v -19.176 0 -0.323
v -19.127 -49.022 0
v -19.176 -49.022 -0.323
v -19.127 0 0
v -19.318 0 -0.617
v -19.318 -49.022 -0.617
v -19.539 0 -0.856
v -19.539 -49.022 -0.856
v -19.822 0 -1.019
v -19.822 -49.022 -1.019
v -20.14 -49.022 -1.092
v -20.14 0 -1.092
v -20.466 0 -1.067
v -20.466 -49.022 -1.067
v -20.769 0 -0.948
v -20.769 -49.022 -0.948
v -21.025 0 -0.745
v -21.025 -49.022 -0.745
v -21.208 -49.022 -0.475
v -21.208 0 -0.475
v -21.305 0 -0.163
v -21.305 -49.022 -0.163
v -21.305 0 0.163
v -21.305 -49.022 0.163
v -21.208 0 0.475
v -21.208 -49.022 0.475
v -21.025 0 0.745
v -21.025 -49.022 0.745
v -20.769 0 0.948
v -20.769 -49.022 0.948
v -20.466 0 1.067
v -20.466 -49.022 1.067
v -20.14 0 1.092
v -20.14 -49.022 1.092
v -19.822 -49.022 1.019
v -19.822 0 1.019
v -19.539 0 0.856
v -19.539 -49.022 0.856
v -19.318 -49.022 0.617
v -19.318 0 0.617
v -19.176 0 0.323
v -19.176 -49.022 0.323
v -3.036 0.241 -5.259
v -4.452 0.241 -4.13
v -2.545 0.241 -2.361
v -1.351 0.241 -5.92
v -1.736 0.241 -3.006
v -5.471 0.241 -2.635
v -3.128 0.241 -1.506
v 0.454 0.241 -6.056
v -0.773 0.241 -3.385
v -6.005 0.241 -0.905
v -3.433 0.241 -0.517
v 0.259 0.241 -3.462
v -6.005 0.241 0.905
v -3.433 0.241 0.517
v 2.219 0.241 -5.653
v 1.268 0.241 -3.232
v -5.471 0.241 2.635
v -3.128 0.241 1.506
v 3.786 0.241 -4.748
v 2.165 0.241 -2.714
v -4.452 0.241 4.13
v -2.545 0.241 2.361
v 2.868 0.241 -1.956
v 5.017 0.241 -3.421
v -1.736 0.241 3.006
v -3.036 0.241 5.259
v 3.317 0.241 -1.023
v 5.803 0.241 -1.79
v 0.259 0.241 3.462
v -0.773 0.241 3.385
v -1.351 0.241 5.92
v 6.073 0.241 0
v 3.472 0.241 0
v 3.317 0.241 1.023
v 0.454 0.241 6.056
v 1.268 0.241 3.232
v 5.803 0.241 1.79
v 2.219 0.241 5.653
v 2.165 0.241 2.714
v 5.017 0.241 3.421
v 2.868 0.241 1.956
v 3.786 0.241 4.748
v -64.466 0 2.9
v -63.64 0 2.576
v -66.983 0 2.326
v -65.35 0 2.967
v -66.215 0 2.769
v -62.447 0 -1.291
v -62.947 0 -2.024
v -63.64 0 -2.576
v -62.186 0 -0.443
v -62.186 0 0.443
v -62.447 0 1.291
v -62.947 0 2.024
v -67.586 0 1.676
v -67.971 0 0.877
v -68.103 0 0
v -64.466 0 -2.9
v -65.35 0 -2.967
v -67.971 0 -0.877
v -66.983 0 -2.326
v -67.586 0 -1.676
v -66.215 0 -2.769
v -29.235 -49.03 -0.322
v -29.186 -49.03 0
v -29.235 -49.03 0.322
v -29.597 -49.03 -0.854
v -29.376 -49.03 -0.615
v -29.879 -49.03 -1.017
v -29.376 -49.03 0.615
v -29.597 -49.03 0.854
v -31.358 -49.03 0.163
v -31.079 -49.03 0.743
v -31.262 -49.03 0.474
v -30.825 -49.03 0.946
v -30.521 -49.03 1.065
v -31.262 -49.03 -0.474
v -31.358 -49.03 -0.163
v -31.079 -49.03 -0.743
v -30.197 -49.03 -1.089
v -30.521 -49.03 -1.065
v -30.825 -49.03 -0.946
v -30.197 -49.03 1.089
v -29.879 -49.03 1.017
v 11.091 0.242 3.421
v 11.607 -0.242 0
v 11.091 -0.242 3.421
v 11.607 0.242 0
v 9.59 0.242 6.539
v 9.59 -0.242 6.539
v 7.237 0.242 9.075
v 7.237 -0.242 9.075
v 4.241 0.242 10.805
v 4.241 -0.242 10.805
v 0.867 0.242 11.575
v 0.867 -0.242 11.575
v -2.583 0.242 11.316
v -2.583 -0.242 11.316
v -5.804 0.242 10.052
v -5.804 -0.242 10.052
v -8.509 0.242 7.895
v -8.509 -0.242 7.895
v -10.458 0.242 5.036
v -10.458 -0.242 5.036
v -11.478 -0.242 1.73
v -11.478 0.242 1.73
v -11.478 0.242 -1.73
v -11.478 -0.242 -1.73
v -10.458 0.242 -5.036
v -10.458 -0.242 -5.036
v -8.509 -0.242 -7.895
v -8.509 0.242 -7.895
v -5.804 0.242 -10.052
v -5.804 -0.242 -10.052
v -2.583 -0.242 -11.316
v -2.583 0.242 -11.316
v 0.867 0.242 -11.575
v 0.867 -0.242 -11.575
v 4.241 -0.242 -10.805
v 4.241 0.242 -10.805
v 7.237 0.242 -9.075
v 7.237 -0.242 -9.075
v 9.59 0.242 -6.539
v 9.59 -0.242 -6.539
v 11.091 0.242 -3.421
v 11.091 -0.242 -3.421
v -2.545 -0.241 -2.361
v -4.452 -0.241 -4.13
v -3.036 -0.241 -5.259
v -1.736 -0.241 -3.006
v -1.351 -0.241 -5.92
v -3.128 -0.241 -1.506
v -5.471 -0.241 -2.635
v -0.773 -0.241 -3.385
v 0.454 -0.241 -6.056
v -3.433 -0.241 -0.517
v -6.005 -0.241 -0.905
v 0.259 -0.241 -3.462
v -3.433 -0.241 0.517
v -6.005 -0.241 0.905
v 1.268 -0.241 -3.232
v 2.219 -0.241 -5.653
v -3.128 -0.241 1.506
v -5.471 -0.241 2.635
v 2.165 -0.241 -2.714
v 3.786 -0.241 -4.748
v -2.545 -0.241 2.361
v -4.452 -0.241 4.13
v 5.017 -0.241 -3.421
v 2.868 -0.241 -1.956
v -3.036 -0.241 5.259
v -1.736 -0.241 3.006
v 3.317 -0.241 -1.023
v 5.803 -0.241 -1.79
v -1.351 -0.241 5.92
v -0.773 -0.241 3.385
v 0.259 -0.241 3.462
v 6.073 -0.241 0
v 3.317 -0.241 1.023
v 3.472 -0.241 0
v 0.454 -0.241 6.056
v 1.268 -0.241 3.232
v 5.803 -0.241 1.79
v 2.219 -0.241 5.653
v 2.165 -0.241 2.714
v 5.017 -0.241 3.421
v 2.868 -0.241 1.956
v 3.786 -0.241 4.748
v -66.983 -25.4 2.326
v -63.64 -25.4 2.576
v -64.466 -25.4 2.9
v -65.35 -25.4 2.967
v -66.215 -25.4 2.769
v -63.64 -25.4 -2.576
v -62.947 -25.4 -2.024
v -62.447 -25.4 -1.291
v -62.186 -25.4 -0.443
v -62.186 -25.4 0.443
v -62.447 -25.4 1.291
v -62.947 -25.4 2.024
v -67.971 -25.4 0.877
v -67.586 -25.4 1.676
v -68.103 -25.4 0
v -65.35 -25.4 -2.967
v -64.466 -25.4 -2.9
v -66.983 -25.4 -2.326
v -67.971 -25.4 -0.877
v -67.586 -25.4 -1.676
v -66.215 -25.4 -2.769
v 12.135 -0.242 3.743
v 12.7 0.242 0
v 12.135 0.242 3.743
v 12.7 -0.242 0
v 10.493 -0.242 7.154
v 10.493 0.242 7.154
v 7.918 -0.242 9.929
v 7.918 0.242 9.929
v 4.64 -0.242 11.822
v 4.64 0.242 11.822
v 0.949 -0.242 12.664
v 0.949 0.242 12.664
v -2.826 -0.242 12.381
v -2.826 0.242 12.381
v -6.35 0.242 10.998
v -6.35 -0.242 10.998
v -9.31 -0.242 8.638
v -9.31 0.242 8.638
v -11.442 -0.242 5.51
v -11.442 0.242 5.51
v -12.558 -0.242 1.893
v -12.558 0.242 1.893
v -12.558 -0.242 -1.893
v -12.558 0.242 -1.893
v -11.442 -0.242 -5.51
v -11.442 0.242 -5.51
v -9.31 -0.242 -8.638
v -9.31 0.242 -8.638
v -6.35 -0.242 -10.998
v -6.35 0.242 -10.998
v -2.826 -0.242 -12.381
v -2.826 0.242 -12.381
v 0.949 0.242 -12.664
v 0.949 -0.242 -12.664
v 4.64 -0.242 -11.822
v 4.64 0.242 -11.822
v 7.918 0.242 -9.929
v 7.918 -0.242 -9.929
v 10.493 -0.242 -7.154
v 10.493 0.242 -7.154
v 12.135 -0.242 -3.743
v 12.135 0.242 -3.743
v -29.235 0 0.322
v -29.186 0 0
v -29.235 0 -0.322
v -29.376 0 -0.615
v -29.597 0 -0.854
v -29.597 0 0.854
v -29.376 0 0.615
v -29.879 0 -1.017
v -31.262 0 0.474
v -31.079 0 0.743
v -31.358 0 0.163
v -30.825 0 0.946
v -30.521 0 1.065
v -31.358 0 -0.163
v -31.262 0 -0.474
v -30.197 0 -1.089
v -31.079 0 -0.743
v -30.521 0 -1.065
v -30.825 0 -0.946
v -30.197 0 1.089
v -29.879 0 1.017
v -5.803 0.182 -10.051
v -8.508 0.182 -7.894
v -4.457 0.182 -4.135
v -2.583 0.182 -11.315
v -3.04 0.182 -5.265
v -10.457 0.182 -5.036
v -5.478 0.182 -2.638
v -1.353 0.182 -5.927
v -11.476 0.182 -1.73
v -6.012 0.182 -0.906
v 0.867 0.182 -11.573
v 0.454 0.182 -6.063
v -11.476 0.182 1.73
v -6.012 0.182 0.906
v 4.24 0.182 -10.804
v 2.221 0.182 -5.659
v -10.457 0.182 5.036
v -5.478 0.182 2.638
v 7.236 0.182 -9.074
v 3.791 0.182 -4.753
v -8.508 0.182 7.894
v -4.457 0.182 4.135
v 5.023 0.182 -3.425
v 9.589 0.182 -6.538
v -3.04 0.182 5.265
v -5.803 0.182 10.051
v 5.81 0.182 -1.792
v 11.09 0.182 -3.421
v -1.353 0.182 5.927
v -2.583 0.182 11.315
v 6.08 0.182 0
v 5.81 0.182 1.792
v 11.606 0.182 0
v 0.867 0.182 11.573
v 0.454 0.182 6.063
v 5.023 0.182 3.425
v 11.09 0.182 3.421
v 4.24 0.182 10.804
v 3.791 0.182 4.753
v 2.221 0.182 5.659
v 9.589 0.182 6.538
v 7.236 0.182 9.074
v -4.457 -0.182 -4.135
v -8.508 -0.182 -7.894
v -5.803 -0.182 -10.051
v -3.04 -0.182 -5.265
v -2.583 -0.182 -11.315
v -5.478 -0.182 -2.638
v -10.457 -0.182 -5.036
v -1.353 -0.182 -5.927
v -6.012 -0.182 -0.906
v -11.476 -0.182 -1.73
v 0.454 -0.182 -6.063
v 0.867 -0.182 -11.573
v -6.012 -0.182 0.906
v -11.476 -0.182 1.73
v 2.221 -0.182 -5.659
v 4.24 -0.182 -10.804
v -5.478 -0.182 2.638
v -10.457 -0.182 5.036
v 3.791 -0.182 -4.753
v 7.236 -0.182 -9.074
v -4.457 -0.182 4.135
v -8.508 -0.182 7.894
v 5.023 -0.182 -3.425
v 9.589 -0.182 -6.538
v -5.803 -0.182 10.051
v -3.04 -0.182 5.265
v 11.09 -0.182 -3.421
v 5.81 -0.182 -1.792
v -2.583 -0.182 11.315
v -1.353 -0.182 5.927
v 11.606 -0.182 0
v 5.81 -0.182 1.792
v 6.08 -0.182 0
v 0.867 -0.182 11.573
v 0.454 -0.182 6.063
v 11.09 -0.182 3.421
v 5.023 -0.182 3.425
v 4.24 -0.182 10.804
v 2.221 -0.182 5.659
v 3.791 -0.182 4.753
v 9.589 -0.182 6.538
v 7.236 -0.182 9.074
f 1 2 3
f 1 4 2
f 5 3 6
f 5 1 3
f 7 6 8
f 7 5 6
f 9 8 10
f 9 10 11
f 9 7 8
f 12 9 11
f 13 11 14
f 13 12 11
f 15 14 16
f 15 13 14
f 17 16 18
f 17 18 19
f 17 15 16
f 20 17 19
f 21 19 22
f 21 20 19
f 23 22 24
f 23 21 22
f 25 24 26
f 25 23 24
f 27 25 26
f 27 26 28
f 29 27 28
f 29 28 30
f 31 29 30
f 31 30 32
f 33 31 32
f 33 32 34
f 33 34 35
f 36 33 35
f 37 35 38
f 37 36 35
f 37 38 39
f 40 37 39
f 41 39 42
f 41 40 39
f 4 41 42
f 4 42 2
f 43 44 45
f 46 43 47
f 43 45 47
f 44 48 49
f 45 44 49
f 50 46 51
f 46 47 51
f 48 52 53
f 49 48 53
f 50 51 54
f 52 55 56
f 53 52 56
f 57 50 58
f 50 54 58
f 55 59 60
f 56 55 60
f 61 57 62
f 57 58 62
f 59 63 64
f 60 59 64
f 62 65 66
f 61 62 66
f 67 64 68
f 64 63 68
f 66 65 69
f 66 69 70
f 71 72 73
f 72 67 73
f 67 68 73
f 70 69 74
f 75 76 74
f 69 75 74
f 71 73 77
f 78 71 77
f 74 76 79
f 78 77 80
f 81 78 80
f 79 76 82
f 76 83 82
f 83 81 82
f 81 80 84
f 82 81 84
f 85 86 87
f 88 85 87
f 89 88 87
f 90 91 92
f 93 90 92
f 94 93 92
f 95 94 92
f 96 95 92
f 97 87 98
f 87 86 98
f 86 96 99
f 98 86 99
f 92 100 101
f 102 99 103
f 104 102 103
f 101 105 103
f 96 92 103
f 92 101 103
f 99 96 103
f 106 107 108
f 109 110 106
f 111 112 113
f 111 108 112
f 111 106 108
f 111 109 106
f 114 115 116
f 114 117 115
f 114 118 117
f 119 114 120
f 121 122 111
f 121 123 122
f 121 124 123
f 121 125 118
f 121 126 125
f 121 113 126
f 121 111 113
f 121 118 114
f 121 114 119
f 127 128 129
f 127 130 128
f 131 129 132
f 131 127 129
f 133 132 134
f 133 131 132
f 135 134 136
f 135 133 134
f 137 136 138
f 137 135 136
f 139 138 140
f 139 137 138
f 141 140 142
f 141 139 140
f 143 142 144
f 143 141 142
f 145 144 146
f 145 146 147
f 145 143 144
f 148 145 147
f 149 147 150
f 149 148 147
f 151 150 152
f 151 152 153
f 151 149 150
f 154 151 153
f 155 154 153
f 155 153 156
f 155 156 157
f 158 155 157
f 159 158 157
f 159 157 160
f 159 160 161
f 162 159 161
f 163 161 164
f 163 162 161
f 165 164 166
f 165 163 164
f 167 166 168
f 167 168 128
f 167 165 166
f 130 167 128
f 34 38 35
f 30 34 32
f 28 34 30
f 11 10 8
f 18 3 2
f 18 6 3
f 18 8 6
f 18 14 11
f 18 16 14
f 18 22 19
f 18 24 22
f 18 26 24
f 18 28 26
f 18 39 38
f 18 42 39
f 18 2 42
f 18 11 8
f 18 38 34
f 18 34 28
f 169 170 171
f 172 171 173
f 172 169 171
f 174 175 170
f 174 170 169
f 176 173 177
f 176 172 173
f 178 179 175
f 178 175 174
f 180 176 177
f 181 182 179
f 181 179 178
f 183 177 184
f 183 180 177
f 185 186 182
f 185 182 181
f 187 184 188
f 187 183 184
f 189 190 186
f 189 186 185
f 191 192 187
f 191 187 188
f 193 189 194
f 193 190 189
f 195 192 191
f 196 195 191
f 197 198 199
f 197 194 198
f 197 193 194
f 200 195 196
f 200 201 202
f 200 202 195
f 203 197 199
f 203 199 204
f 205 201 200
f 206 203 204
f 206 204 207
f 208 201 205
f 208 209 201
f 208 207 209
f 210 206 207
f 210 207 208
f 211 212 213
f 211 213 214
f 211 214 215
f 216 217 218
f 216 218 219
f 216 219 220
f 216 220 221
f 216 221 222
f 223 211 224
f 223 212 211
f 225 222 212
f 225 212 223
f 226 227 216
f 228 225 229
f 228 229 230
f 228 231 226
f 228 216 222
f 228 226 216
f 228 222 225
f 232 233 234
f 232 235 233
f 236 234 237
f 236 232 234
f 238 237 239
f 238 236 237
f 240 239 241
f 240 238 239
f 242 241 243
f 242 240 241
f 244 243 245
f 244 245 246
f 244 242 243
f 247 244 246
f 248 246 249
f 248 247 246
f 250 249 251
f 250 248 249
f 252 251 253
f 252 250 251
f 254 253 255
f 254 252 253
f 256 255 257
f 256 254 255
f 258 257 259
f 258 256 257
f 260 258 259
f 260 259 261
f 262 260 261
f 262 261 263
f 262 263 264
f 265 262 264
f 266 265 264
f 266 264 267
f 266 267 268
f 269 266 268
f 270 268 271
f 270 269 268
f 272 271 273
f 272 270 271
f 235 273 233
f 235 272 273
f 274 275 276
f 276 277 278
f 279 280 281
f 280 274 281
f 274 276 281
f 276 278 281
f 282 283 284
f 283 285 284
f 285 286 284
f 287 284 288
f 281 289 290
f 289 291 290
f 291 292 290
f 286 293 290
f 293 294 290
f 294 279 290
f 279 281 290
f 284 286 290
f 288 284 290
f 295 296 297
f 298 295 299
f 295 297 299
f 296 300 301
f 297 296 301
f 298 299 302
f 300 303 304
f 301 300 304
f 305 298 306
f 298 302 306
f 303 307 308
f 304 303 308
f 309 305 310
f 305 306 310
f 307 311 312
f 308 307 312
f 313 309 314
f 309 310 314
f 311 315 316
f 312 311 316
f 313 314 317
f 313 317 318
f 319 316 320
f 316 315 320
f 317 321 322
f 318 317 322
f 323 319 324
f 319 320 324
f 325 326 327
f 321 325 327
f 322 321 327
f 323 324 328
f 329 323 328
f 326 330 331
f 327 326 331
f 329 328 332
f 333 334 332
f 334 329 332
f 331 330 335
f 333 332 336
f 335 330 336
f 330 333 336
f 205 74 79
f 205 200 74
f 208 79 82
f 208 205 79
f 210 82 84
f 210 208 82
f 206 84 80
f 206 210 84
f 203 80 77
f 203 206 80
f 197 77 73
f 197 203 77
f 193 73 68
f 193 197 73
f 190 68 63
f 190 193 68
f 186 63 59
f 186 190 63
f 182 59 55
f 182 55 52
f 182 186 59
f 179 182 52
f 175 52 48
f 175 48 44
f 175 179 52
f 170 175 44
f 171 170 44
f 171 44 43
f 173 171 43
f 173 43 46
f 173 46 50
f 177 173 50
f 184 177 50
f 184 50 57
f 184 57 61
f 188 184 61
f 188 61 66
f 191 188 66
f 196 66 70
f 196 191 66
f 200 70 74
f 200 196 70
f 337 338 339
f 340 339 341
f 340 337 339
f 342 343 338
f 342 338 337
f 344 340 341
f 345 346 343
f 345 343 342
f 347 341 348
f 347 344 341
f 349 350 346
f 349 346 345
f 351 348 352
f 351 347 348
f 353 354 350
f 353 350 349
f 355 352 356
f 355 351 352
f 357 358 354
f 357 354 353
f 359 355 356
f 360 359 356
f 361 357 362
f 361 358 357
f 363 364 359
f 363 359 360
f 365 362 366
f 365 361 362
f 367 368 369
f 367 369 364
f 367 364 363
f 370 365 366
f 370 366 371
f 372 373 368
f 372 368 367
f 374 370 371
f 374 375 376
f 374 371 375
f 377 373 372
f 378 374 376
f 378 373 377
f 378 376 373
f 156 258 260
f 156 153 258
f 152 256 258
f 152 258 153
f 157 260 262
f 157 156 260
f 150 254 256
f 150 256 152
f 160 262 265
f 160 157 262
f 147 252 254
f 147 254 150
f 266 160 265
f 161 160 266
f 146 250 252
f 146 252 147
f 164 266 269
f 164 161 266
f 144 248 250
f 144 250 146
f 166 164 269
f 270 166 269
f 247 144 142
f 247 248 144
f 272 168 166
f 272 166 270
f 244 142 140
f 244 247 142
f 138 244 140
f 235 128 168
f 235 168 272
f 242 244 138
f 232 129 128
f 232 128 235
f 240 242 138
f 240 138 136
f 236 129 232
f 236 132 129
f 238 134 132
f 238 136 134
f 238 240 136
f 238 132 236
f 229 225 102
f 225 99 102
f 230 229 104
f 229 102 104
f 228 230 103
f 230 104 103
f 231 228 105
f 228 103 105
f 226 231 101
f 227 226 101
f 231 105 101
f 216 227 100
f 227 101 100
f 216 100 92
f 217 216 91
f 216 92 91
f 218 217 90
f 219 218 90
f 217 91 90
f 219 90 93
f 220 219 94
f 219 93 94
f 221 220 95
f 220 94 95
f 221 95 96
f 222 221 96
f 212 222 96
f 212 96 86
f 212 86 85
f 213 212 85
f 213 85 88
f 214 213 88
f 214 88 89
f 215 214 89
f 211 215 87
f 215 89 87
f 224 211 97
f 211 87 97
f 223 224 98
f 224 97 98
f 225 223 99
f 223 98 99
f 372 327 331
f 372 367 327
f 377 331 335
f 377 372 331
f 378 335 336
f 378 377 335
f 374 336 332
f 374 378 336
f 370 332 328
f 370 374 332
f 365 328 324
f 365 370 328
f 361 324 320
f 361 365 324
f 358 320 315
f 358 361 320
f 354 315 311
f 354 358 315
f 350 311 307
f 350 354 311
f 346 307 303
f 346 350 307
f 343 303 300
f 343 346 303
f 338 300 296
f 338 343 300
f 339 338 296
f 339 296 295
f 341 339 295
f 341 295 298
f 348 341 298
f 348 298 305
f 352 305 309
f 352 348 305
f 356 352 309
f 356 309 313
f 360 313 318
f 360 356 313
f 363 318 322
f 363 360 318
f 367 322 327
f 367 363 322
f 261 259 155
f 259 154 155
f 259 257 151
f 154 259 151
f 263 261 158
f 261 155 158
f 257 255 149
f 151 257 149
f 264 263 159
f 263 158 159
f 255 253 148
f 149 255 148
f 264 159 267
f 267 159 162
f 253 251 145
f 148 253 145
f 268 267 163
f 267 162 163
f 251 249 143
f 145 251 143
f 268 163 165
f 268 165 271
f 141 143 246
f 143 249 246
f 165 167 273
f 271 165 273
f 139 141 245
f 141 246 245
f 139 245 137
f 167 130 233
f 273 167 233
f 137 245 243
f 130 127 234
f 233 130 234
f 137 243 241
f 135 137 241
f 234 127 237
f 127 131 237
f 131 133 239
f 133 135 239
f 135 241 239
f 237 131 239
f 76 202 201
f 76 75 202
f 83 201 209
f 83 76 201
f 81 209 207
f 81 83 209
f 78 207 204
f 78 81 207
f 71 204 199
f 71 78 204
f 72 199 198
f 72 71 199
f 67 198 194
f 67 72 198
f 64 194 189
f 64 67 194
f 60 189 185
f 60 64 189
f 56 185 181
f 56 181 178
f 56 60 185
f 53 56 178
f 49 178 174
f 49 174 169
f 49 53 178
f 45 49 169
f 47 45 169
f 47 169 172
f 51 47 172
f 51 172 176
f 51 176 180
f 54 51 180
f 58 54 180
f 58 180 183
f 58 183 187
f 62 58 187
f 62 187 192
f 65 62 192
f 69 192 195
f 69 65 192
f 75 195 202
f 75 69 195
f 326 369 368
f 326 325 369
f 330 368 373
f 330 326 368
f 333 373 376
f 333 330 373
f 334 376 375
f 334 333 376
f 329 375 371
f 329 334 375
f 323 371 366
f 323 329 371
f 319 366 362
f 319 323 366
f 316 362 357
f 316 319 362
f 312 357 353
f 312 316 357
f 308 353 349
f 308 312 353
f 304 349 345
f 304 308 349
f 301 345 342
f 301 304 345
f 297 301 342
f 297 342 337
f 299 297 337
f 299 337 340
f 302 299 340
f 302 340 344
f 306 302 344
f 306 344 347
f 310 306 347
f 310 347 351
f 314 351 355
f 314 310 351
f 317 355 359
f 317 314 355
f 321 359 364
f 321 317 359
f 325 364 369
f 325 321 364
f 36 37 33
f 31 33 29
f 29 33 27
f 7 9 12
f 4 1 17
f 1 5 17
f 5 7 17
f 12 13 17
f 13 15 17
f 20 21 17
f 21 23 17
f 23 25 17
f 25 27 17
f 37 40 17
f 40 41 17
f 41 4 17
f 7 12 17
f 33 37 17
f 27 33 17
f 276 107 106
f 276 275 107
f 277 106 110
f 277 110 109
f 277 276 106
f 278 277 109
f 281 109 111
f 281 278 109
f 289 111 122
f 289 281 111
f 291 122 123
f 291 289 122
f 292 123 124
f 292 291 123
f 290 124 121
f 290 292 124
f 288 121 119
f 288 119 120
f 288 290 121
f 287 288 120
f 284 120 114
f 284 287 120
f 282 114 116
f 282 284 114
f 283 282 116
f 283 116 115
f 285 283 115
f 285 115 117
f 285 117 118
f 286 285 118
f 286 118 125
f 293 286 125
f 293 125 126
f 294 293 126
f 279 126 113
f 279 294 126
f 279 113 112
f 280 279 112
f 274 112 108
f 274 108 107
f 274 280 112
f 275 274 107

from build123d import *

# Parameters (mm, degrees)
F0_R     = 6.0725998207
F0_R_2   = 3.4715977251
F1_DEPTH = 0.2413
F0_R_3   = 11.6058825816
F0_R_4   = 6.0796561399
F2_DEPTH = 0.18214
F0_R_5   = 12.6996477949
F0_R_6   = 11.6071716778
F3_DEPTH = 0.242
F4_W     = 2.9750799122
F4_H     = 25.4
F6_W     = 1.0922
F6_H     = 49.0303058
F8_W     = 1.094782725
F8_H     = 49.022


with BuildPart() as f1:
    # F0 (on Front) → F1 (new body, symmetric)
    with BuildSketch(Plane.XZ):
        Circle(F0_R)
        Circle(F0_R_2, mode=Mode.SUBTRACT)
    extrude(amount=F1_DEPTH, both=True)


with BuildPart() as f2:
    # F0 (on Front) → F2 (new body, symmetric)
    with BuildSketch(Plane.XZ):
        Circle(F0_R_3)
        Circle(F0_R_4, mode=Mode.SUBTRACT)
    extrude(amount=F2_DEPTH, both=True)


with BuildPart() as f3:
    # F0 (on Front) → F3 (new body, symmetric)
    with BuildSketch(Plane.XZ):
        Circle(F0_R_5)
        Circle(F0_R_6, mode=Mode.SUBTRACT)
    extrude(amount=F3_DEPTH, both=True)


with BuildPart() as f5:
    # F4 (on Top) → F5 (revolve)
    with BuildSketch(Plane.XY):
        with Locations((-66.6152926774, -12.7)):
            Rectangle(F4_W, F4_H)
    revolve(axis=Axis((-65.1277527213, -12.7, 0), (0, -1, 0)))


with BuildPart() as f7:
    # F6 (on Top) → F7 (revolve)
    with BuildSketch(Plane.XY):
        with Locations((-29.7323461086, -24.5151529)):
            Rectangle(F6_W, F6_H)
    revolve(axis=Axis((-30.2784461086, -24.5151529, 0), (0, 1, 0)))


with BuildPart() as f9:
    # F8 (on Top) → F9 (revolve)
    with BuildSketch(Plane.XY):
        with Locations((-19.6746652946, -24.511)):
            Rectangle(F8_W, F8_H)
    revolve(axis=Axis((-20.2220566571, -24.511, 0), (0, 1, 0)))


solid = Compound([f1.part, f2.part, f3.part, f5.part, f7.part, f9.part])
